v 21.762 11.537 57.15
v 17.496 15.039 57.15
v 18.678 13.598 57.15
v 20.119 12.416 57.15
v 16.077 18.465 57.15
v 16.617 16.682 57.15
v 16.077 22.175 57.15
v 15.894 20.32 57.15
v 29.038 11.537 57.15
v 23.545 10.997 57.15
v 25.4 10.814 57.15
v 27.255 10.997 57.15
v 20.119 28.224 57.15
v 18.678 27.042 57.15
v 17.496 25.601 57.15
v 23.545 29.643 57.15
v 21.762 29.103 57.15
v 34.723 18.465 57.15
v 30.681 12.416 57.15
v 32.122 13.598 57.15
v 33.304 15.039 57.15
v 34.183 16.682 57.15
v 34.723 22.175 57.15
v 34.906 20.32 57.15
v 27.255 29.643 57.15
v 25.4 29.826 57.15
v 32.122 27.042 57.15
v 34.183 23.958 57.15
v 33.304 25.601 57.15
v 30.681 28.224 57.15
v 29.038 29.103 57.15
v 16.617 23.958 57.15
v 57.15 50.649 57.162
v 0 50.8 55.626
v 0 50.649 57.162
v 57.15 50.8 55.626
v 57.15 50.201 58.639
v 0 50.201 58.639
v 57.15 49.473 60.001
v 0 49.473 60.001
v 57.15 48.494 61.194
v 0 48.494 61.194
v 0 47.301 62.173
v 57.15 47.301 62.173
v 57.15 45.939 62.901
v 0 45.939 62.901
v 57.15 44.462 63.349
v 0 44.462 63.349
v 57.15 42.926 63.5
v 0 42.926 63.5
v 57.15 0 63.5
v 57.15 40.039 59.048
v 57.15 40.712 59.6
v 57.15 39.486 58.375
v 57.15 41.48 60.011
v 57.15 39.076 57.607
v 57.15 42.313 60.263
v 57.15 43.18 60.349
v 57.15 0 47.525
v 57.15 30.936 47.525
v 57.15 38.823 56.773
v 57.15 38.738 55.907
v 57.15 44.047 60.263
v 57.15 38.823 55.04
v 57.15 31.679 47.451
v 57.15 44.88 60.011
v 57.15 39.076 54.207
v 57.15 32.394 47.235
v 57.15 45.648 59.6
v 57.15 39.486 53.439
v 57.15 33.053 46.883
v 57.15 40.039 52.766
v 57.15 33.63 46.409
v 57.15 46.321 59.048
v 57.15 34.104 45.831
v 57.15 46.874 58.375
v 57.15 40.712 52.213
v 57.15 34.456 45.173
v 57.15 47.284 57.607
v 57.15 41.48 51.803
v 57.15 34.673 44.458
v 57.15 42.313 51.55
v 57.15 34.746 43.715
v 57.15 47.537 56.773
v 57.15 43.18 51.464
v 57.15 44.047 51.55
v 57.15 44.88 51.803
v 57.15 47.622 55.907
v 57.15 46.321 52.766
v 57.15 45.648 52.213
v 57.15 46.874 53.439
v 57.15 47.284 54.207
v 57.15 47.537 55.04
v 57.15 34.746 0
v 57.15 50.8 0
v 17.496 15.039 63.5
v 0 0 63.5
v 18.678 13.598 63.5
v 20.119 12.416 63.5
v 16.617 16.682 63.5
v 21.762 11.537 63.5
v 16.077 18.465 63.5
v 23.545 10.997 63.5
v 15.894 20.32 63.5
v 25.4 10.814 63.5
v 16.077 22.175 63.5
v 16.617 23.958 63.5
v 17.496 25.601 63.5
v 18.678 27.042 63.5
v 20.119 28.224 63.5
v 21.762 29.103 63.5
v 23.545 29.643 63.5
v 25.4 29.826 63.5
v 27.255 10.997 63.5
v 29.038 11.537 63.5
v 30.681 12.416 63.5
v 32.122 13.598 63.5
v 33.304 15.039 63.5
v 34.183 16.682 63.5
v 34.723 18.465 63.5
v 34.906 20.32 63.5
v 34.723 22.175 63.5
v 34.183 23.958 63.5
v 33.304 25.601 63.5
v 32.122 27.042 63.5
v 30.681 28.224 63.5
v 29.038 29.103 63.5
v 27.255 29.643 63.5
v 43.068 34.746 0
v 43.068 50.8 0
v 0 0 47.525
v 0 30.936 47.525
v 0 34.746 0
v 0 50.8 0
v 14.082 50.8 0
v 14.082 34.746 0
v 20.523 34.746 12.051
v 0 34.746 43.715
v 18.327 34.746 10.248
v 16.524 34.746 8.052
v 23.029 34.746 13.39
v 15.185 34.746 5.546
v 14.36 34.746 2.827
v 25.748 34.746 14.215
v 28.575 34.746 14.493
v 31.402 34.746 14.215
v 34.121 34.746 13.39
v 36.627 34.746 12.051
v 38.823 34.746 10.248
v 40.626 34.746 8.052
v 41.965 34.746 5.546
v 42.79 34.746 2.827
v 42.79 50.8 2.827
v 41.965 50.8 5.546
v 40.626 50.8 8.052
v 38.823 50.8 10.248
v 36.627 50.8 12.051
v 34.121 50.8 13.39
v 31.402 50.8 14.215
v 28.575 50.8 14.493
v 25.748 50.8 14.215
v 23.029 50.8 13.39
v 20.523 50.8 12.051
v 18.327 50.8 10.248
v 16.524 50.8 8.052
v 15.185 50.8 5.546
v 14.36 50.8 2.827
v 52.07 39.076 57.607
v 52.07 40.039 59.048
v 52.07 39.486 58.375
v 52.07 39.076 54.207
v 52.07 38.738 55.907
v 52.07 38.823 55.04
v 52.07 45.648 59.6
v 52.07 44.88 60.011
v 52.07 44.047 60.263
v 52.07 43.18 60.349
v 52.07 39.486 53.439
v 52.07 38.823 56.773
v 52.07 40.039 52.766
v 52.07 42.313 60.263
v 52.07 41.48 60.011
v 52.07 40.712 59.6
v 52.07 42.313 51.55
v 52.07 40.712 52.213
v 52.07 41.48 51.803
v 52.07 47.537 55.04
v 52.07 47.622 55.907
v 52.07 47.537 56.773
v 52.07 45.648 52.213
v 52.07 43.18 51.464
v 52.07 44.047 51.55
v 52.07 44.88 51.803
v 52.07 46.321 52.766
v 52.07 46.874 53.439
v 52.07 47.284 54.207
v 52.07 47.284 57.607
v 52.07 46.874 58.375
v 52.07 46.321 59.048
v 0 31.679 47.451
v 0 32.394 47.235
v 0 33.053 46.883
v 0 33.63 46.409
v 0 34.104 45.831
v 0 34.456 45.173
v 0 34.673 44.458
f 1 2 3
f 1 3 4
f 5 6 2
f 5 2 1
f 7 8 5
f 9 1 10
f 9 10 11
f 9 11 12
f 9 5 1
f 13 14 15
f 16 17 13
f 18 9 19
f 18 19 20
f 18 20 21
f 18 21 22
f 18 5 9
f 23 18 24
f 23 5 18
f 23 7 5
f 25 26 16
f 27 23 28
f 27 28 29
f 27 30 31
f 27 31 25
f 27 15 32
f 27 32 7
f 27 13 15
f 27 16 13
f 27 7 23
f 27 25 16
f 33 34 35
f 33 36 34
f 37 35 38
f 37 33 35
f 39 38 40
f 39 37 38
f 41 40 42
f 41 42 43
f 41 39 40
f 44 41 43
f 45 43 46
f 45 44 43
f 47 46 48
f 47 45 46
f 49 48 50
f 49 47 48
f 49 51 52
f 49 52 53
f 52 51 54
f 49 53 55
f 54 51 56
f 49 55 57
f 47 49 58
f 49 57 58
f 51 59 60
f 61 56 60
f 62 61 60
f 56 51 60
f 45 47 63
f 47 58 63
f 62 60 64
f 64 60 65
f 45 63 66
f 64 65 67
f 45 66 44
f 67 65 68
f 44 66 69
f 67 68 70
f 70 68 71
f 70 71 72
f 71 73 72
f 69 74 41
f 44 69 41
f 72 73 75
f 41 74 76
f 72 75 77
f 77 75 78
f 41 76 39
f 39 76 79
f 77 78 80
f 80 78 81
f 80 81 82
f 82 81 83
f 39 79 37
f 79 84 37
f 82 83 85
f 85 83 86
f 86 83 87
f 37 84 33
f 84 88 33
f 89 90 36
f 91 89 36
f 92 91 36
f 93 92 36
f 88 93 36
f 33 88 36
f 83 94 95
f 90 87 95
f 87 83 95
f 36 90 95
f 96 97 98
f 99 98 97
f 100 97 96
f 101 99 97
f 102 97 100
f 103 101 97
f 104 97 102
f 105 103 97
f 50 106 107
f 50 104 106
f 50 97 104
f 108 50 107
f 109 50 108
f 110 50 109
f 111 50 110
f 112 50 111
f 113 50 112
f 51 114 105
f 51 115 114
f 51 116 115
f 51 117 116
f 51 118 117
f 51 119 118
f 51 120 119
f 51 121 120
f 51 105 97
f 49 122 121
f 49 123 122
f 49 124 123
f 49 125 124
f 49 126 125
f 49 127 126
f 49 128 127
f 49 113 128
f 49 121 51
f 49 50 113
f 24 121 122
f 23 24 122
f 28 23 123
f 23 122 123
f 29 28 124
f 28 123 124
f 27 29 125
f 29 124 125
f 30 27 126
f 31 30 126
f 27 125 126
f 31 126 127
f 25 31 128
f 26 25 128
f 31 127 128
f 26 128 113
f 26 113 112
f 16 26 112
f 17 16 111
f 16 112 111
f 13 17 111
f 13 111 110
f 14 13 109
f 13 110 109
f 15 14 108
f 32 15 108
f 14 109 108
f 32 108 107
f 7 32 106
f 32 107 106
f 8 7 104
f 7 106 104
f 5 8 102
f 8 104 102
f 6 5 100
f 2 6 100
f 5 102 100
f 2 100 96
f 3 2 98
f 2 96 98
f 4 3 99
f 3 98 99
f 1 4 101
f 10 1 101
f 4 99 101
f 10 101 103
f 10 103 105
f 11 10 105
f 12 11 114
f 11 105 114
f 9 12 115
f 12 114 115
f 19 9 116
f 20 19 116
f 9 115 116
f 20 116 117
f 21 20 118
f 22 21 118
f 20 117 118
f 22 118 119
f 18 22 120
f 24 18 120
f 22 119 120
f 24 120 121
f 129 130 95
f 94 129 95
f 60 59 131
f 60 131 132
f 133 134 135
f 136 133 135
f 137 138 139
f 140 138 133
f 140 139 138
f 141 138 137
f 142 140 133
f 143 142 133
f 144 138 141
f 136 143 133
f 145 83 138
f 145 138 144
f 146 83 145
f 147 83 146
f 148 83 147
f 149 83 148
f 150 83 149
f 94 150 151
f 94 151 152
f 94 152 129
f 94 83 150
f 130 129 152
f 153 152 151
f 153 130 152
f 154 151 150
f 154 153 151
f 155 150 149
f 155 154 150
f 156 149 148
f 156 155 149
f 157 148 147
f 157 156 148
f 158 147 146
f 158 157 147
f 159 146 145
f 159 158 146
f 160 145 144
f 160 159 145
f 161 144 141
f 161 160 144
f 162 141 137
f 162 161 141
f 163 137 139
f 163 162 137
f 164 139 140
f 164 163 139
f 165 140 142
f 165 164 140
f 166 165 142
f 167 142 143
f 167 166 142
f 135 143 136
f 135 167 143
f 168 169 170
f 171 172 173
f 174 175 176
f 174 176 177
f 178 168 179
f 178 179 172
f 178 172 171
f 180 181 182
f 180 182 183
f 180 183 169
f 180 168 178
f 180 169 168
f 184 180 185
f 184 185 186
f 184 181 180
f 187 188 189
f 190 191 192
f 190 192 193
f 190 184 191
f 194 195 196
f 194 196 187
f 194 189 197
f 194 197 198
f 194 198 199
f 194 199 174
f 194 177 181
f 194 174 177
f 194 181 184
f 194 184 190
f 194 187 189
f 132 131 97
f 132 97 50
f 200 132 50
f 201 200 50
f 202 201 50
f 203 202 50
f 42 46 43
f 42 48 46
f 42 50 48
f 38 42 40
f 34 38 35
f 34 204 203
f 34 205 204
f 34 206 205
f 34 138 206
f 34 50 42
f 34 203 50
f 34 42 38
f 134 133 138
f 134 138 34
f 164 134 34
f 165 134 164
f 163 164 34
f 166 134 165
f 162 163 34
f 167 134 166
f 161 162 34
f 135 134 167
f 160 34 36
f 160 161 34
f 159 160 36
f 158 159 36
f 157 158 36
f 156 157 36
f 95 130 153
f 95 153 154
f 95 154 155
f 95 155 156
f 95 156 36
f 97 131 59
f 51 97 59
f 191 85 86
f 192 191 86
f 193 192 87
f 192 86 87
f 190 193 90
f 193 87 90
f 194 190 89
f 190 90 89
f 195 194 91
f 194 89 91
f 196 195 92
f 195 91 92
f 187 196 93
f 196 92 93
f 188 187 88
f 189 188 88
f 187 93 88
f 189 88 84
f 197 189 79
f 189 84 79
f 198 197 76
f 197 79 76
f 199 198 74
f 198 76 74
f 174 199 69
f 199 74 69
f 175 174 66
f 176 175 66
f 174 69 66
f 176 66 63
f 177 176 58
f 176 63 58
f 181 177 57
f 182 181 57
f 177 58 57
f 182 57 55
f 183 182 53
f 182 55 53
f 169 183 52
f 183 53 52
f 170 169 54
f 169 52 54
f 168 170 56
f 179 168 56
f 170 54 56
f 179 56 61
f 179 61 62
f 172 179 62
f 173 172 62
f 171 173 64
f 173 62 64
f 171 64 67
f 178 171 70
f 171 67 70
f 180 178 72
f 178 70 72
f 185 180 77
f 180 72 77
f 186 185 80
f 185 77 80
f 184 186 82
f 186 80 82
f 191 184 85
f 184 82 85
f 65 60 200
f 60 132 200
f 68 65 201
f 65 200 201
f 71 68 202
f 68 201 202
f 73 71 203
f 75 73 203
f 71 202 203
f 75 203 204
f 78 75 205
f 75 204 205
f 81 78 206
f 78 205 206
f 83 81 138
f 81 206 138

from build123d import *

# Parameters (mm, degrees)
SKETCH1_W           = 57.15
SKETCH1_H           = 50.8
BOSS_EXTRUDE1_DEPTH = 63.5
SKETCH2_R           = 9.506140486
CUT_EXTRUDE1_DEPTH  = 6.35
FILLET1_R           = 7.874
SKETCH3_W           = 47.524607072
SKETCH3_H           = 34.745914464
CUT_EXTRUDE2_DEPTH  = 57.15
FILLET2_R           = 3.81
SKETCH4_R           = 4.44219446
CUT_EXTRUDE3_DEPTH  = 5.08
CUT_EXTRUDE4_DEPTH  = 25.4


with BuildPart() as part:
    # Sketch1 → Boss-Extrude1 (new body)
    with BuildSketch(Plane.XY):
        with Locations((28.575, 25.4)):
            Rectangle(SKETCH1_W, SKETCH1_H)
    extrude(amount=BOSS_EXTRUDE1_DEPTH)

    # Sketch2 → Cut-Extrude1 (cut)
    with BuildSketch(Plane.XY.offset(63.5)):
        with Locations((25.4, 20.32)):
            Circle(SKETCH2_R)
    extrude(amount=-CUT_EXTRUDE1_DEPTH, mode=Mode.SUBTRACT)

    # Fillet1
    fillet1_edges = [part.edges().sort_by_distance(p)[0] for p in [
        (28.575, 50.8, 63.5),
    ]]
    fillet(fillet1_edges, radius=FILLET1_R)

    # Sketch3 → Cut-Extrude2 (cut)
    with BuildSketch(Plane(origin=(57.15, 0, 0), x_dir=(0, 0, -1), z_dir=(1, 0, 0))):
        with Locations((-23.762303536, 17.372957232)):
            Rectangle(SKETCH3_W, SKETCH3_H)
    extrude(amount=-CUT_EXTRUDE2_DEPTH, mode=Mode.SUBTRACT)

    # Fillet2
    fillet2_edges = [part.edges().sort_by_distance(p)[0] for p in [
        (28.575, 34.745914464, 47.524607072),
    ]]
    fillet(fillet2_edges, radius=FILLET2_R)

    # Sketch4 → Cut-Extrude3 (cut)
    with BuildSketch(Plane(origin=(57.15, 0, 0), x_dir=(0, 0, -1), z_dir=(1, 0, 0))):
        with Locations((-55.906607072, 43.18)):
            Circle(SKETCH4_R)
    extrude(amount=-CUT_EXTRUDE3_DEPTH, mode=Mode.SUBTRACT)

    # Sketch5 → Cut-Extrude4 (cut)
    with BuildSketch(Plane(origin=(0, 50.8, 0), x_dir=(1, 0, 0), z_dir=(0, 1, 0))):
        with BuildLine():
            Line((14.081947764, 0), (43.068052236, 0))
            ThreePointArc((43.068052236, 0), (28.575, -14.493052236), (14.081947764, 0))
        make_face()
    extrude(amount=-CUT_EXTRUDE4_DEPTH, mode=Mode.SUBTRACT)


solid = part.part
